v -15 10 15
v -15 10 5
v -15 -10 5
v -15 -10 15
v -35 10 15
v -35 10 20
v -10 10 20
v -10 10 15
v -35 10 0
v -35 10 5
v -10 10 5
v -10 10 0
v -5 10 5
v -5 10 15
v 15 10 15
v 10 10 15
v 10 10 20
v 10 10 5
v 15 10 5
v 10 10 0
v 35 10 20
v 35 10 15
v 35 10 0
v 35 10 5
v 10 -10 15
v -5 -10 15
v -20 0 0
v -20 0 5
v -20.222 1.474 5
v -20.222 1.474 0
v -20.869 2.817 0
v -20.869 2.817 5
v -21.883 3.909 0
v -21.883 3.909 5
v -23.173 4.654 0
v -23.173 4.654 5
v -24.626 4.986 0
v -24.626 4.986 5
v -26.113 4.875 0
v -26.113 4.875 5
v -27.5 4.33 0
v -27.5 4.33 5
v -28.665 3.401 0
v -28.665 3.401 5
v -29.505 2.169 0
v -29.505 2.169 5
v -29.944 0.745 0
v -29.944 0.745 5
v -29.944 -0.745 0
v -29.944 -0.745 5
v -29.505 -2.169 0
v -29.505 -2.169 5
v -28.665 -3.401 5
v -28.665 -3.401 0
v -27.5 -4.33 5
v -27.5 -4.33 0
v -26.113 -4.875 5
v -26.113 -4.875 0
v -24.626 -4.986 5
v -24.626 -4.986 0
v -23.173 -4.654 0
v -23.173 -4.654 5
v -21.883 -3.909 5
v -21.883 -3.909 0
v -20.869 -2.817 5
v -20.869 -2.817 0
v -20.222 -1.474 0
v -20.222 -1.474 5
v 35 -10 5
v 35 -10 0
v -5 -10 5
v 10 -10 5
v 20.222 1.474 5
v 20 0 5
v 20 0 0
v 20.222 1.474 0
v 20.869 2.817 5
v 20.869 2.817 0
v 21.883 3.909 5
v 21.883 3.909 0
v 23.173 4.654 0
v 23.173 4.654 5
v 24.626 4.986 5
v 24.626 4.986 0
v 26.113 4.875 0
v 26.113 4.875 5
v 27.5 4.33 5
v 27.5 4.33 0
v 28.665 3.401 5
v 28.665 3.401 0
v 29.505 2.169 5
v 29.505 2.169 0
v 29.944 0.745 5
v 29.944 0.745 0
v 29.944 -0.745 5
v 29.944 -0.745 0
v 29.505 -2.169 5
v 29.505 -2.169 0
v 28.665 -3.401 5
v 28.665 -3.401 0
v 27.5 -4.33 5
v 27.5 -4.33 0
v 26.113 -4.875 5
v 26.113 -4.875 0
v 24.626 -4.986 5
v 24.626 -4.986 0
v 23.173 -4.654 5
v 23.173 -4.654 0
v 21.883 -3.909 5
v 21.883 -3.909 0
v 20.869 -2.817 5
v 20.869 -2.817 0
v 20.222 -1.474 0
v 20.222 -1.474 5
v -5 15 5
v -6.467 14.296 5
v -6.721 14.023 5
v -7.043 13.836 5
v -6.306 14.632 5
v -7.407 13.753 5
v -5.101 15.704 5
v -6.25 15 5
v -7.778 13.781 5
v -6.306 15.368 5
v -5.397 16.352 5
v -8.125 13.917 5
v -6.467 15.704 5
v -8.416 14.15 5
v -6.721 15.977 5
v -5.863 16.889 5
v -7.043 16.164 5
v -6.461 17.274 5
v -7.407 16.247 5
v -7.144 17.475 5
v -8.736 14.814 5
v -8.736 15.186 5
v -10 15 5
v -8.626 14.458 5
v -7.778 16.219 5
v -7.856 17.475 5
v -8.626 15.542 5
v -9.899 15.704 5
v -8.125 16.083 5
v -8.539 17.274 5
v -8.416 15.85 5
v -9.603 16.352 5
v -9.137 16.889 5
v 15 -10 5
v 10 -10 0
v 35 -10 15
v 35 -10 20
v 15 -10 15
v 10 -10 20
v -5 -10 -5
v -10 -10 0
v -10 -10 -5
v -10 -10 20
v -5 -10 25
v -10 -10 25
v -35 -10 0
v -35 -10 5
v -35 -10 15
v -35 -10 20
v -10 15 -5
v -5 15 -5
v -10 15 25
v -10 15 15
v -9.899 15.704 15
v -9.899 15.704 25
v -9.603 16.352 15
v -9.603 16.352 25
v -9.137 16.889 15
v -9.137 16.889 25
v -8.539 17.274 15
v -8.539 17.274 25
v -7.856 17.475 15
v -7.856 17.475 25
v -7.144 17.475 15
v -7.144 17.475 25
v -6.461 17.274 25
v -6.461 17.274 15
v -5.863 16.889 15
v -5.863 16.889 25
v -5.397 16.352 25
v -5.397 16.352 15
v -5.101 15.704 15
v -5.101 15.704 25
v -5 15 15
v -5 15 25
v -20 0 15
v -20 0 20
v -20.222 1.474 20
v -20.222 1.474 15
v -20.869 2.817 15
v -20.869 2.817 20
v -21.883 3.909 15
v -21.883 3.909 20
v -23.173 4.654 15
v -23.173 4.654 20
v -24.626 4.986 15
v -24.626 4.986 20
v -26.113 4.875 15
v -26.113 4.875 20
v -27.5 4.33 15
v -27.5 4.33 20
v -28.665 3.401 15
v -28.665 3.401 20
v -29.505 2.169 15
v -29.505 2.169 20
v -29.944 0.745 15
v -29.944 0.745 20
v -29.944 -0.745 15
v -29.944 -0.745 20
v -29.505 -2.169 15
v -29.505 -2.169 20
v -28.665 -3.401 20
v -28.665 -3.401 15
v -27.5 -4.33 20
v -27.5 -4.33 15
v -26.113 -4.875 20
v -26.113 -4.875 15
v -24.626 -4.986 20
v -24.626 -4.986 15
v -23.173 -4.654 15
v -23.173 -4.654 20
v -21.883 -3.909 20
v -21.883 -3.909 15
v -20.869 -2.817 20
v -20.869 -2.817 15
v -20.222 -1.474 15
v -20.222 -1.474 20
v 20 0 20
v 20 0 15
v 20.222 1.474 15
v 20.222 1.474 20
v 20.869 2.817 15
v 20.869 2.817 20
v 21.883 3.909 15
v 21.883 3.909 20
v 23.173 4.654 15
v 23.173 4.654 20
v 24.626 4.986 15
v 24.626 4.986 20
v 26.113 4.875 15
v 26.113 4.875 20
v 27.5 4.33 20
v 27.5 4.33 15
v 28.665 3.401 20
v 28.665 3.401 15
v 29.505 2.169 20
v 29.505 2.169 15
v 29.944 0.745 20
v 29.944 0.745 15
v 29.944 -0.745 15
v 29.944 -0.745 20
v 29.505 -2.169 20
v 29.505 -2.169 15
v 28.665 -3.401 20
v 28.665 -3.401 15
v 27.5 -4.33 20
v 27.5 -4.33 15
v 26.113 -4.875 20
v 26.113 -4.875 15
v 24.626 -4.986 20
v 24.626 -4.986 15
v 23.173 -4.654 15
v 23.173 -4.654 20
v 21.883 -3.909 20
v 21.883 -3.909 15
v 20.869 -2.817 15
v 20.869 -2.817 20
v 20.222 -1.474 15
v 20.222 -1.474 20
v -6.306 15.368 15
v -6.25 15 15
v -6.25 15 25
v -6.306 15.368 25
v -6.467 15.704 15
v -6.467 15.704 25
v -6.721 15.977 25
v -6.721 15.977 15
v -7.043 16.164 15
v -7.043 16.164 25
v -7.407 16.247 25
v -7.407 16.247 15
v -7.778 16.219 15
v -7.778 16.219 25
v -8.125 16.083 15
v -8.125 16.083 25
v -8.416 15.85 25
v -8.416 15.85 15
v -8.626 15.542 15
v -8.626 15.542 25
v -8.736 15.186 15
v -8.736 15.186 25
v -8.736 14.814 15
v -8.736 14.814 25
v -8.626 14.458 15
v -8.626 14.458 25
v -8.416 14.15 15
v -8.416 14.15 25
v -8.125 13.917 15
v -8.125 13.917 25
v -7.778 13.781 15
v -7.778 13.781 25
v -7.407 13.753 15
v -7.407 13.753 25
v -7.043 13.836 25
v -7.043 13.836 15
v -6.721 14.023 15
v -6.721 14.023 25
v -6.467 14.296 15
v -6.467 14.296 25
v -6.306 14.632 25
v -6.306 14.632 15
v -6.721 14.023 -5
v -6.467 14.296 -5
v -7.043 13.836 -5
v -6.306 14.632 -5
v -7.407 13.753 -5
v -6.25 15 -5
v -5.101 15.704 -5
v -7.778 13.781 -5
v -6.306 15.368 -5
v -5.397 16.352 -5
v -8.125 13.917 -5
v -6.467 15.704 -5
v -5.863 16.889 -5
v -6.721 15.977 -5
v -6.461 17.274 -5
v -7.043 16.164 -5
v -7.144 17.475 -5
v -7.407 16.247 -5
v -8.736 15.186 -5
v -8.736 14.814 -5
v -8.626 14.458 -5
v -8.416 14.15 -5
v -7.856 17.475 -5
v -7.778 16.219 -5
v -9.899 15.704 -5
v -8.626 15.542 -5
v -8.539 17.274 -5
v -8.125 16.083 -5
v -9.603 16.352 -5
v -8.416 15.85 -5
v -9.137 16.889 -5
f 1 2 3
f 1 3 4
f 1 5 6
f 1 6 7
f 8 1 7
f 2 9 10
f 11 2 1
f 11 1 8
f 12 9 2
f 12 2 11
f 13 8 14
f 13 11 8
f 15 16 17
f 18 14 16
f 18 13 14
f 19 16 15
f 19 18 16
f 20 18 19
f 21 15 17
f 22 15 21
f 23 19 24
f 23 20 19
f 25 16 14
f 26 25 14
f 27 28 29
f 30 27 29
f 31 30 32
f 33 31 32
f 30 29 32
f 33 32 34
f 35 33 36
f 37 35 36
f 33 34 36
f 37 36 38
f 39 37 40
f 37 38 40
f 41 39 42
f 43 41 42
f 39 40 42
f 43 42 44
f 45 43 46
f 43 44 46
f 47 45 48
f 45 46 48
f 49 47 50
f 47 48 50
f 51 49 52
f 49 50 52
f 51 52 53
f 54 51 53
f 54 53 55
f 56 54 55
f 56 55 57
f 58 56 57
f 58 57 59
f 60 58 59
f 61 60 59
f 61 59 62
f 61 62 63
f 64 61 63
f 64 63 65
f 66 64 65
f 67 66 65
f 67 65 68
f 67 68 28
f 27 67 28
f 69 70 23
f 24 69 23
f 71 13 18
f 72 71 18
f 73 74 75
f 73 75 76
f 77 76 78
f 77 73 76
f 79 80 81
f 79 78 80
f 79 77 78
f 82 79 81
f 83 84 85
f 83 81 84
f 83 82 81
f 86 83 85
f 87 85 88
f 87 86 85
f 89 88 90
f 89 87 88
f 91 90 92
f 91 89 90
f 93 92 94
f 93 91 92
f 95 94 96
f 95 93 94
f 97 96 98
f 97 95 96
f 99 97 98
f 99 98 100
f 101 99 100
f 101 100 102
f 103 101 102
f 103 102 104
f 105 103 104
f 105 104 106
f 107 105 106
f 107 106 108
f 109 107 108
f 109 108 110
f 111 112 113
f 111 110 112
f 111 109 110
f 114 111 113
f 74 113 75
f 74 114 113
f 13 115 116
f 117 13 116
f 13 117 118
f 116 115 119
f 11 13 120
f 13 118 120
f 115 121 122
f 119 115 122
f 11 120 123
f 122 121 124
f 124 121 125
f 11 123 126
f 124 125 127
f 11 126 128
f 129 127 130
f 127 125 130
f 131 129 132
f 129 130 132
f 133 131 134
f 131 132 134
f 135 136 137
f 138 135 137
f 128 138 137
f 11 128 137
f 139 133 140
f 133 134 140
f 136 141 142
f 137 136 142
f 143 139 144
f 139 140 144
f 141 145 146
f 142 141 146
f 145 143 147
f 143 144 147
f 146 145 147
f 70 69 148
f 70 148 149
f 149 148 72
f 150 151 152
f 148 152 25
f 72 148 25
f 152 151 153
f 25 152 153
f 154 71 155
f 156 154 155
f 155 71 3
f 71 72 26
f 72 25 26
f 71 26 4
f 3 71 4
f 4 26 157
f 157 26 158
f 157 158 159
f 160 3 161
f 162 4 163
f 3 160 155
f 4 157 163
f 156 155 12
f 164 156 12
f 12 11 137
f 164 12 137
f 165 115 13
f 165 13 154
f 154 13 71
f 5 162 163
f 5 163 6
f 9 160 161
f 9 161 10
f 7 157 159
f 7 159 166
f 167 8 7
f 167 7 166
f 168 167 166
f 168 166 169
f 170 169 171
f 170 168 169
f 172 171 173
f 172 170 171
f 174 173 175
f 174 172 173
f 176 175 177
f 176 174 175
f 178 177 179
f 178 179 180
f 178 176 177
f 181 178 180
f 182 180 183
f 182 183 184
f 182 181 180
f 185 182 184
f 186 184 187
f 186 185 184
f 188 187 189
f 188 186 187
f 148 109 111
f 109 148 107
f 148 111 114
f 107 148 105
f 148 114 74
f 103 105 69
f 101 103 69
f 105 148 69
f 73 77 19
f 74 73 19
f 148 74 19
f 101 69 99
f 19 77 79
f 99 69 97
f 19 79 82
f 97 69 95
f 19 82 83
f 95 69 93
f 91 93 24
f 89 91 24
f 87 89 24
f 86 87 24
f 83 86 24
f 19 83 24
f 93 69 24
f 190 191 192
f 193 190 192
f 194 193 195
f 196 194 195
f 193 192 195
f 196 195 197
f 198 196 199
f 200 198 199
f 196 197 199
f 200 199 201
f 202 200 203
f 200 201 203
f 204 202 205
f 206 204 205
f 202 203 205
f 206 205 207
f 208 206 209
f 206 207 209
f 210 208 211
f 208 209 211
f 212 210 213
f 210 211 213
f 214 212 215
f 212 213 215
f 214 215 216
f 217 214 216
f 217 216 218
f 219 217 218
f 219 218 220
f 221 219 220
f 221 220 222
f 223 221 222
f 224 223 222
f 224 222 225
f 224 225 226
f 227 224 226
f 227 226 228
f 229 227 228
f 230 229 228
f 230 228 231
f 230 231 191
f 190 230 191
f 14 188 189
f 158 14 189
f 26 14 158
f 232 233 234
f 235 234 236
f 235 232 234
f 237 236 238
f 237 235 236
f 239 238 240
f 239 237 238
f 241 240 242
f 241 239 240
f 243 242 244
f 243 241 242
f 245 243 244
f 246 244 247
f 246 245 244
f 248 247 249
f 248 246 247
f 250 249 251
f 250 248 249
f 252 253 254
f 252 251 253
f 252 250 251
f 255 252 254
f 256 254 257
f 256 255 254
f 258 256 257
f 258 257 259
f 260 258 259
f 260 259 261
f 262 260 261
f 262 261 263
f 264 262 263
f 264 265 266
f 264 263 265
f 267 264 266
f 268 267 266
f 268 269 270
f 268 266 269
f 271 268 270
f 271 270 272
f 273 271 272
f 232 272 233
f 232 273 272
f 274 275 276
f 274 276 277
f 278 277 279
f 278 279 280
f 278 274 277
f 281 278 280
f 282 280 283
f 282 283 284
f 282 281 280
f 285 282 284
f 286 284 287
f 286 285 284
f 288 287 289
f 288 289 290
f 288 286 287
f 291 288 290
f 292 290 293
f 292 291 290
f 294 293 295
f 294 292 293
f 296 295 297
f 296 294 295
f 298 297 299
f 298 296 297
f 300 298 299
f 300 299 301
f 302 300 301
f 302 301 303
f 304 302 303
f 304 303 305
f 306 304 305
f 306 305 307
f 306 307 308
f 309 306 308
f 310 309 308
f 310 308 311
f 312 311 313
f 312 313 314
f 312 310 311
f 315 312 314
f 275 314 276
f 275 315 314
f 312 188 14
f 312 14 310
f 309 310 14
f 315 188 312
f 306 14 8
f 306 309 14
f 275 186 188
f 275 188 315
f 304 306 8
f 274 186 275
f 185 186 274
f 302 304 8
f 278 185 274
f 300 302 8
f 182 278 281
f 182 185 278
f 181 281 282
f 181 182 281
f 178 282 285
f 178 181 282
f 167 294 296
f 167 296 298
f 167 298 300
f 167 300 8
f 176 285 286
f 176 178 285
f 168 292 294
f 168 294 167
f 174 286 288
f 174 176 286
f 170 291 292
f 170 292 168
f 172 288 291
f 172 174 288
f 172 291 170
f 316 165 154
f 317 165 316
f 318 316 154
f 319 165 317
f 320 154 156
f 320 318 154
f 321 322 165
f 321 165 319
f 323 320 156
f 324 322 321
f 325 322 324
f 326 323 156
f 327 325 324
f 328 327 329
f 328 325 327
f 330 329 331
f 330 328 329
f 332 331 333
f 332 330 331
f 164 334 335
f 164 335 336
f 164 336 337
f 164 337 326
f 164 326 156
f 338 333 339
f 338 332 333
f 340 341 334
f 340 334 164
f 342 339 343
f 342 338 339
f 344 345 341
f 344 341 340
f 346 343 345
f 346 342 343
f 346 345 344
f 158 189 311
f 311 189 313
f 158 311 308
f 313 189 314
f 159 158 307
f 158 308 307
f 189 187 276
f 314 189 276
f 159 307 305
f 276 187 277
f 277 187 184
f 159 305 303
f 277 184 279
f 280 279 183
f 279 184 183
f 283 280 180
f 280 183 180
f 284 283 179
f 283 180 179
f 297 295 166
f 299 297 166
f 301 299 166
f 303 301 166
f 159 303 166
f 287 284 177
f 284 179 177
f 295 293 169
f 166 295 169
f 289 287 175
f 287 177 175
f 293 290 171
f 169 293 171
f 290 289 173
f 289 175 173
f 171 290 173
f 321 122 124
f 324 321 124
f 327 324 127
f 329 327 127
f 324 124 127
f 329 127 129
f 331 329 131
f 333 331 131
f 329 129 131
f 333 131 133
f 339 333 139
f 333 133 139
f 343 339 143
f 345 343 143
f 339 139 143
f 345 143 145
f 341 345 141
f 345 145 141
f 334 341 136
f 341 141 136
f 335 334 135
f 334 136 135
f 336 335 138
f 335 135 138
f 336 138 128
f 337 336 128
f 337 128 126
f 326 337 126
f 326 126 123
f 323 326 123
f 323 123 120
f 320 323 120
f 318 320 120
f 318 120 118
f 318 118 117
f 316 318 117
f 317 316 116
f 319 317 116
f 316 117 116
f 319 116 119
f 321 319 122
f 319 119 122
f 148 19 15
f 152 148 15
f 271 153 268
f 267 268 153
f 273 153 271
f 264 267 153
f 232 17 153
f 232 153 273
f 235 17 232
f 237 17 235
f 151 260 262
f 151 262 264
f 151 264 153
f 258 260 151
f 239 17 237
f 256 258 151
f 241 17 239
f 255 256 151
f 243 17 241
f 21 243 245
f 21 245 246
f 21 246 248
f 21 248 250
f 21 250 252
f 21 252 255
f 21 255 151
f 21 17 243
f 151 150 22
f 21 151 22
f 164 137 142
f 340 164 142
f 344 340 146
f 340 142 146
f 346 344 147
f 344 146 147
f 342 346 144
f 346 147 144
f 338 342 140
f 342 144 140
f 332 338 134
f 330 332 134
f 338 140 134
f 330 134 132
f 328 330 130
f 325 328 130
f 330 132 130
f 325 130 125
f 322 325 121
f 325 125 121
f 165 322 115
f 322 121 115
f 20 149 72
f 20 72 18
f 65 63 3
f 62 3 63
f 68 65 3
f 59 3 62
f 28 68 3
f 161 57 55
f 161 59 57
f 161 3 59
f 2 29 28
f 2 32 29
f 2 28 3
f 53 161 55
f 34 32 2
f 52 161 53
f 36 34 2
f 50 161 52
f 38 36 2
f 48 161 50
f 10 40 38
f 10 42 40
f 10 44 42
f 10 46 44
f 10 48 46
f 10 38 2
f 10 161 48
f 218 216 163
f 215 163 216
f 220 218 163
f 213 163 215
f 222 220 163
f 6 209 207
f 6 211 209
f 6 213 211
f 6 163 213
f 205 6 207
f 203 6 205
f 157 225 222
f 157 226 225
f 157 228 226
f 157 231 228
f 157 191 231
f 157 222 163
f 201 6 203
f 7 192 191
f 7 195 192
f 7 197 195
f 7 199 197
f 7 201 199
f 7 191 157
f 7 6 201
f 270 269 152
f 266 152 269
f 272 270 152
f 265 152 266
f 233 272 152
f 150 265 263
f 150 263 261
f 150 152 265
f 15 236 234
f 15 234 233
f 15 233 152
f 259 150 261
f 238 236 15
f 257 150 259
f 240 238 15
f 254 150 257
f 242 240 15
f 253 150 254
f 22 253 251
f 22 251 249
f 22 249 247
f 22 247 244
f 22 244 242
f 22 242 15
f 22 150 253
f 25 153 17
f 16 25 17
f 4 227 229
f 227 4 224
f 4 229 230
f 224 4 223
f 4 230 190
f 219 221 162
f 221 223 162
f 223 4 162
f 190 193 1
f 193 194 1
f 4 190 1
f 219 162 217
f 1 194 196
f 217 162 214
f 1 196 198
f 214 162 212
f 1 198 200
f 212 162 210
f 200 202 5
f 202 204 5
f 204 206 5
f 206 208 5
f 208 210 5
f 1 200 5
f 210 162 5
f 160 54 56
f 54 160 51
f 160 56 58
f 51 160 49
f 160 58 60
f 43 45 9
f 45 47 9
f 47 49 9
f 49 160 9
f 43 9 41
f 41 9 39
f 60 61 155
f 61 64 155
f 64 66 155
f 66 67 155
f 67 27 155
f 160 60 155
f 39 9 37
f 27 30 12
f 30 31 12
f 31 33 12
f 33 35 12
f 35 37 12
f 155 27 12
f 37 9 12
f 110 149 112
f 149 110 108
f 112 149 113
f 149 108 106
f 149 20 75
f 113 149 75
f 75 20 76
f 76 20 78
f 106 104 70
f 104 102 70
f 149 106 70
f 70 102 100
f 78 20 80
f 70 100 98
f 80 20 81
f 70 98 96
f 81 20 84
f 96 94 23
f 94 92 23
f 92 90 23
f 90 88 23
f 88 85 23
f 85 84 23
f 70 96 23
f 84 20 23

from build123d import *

# Parameters (mm, degrees)
SKETCH1_W               = 70
SKETCH1_H               = 20
BOSS_EXTRUDE1_DEPTH     = 20
SKETCH2_W               = 10
SKETCH2_H               = 20
CUT_EXTRUDE1_DEPTH      = 20
SKETCH3_R               = 5
CUT_EXTRUDE2_DEPTH      = 60
SKETCH4_W               = 10
SKETCH4_H               = 20
CUT_EXTRUDE3_DEPTH      = 5
MIRROR3_COPY_1_SKETCH_W = 10
MIRROR3_COPY_1_SKETCH_H = 20
MIRROR3_COPY_1_DEPTH    = 5
SKETCH7_R               = 1.25
BOSS_EXTRUDE2_DEPTH     = 10


with BuildPart() as part:
    # Sketch1 → Boss-Extrude1 (new body)
    with BuildSketch(Plane.XY):
        Rectangle(SKETCH1_W, SKETCH1_H)
    extrude(amount=BOSS_EXTRUDE1_DEPTH)

    # Sketch2 → Cut-Extrude1 (cut)
    with BuildSketch(Plane.ZY.offset(35)):
        with Locations((10, 0)):
            Rectangle(SKETCH2_W, SKETCH2_H)
    cut_extrude1 = extrude(amount=-CUT_EXTRUDE1_DEPTH, mode=Mode.SUBTRACT)

    # Sketch3 → Cut-Extrude2 (cut)
    with BuildSketch(Plane.XY.offset(20)):
        with Locations((-25, 0)):
            Circle(SKETCH3_R)
    cut_extrude2 = extrude(amount=-CUT_EXTRUDE2_DEPTH, mode=Mode.SUBTRACT)

    # Sketch4 → Cut-Extrude3 (cut)
    with BuildSketch(Plane.XY.offset(20)):
        with Locations((-5, 0)):
            Rectangle(SKETCH4_W, SKETCH4_H)
    cut_extrude3 = extrude(amount=-CUT_EXTRUDE3_DEPTH, mode=Mode.SUBTRACT)

    # Mirror2: Cut-Extrude3 across plane
    add(cut_extrude3.mirror(Plane.XY.offset(10)), mode=Mode.SUBTRACT)

    # Mirror3: Cut-Extrude1, Cut-Extrude2, Cut-Extrude3 across plane
    add(cut_extrude1.mirror(Plane(origin=(0, 0, 0), x_dir=(0, 0, 1), z_dir=(1, 0, 0))), mode=Mode.SUBTRACT)
    add(cut_extrude2.mirror(Plane(origin=(0, 0, 0), x_dir=(0, 0, 1), z_dir=(1, 0, 0))), mode=Mode.SUBTRACT)
    add(cut_extrude3.mirror(Plane(origin=(0, 0, 0), x_dir=(0, 0, 1), z_dir=(1, 0, 0))), mode=Mode.SUBTRACT)

    # Mirror3 copy 1 sketch → Mirror3 copy 1 (cut)
    with BuildSketch(Plane(origin=(0, 0, 0), x_dir=(-1, 0, 0), z_dir=(0, 0, -1))):
        with Locations((-5, 0)):
            Rectangle(MIRROR3_COPY_1_SKETCH_W, MIRROR3_COPY_1_SKETCH_H)
    extrude(amount=-MIRROR3_COPY_1_DEPTH, mode=Mode.SUBTRACT)

    # Sketch7 → Boss-Extrude2 (add)
    with BuildSketch(Plane.XY.offset(15)):
        with BuildLine():
            Line((-10, -10), (-10, 15))
            ThreePointArc((-10, 15), (-7.5, 17.5), (-5, 15))
            Line((-5, 15), (-5, -10))
            Line((-5, -10), (-10, -10))
        make_face()
        with Locations((-7.5, 15)):
            Circle(SKETCH7_R, mode=Mode.SUBTRACT)
    boss_extrude2 = extrude(amount=BOSS_EXTRUDE2_DEPTH)

    # Mirror4: Boss-Extrude2 across plane
    add(boss_extrude2.mirror(Plane.XY.offset(10)))


solid = part.part
